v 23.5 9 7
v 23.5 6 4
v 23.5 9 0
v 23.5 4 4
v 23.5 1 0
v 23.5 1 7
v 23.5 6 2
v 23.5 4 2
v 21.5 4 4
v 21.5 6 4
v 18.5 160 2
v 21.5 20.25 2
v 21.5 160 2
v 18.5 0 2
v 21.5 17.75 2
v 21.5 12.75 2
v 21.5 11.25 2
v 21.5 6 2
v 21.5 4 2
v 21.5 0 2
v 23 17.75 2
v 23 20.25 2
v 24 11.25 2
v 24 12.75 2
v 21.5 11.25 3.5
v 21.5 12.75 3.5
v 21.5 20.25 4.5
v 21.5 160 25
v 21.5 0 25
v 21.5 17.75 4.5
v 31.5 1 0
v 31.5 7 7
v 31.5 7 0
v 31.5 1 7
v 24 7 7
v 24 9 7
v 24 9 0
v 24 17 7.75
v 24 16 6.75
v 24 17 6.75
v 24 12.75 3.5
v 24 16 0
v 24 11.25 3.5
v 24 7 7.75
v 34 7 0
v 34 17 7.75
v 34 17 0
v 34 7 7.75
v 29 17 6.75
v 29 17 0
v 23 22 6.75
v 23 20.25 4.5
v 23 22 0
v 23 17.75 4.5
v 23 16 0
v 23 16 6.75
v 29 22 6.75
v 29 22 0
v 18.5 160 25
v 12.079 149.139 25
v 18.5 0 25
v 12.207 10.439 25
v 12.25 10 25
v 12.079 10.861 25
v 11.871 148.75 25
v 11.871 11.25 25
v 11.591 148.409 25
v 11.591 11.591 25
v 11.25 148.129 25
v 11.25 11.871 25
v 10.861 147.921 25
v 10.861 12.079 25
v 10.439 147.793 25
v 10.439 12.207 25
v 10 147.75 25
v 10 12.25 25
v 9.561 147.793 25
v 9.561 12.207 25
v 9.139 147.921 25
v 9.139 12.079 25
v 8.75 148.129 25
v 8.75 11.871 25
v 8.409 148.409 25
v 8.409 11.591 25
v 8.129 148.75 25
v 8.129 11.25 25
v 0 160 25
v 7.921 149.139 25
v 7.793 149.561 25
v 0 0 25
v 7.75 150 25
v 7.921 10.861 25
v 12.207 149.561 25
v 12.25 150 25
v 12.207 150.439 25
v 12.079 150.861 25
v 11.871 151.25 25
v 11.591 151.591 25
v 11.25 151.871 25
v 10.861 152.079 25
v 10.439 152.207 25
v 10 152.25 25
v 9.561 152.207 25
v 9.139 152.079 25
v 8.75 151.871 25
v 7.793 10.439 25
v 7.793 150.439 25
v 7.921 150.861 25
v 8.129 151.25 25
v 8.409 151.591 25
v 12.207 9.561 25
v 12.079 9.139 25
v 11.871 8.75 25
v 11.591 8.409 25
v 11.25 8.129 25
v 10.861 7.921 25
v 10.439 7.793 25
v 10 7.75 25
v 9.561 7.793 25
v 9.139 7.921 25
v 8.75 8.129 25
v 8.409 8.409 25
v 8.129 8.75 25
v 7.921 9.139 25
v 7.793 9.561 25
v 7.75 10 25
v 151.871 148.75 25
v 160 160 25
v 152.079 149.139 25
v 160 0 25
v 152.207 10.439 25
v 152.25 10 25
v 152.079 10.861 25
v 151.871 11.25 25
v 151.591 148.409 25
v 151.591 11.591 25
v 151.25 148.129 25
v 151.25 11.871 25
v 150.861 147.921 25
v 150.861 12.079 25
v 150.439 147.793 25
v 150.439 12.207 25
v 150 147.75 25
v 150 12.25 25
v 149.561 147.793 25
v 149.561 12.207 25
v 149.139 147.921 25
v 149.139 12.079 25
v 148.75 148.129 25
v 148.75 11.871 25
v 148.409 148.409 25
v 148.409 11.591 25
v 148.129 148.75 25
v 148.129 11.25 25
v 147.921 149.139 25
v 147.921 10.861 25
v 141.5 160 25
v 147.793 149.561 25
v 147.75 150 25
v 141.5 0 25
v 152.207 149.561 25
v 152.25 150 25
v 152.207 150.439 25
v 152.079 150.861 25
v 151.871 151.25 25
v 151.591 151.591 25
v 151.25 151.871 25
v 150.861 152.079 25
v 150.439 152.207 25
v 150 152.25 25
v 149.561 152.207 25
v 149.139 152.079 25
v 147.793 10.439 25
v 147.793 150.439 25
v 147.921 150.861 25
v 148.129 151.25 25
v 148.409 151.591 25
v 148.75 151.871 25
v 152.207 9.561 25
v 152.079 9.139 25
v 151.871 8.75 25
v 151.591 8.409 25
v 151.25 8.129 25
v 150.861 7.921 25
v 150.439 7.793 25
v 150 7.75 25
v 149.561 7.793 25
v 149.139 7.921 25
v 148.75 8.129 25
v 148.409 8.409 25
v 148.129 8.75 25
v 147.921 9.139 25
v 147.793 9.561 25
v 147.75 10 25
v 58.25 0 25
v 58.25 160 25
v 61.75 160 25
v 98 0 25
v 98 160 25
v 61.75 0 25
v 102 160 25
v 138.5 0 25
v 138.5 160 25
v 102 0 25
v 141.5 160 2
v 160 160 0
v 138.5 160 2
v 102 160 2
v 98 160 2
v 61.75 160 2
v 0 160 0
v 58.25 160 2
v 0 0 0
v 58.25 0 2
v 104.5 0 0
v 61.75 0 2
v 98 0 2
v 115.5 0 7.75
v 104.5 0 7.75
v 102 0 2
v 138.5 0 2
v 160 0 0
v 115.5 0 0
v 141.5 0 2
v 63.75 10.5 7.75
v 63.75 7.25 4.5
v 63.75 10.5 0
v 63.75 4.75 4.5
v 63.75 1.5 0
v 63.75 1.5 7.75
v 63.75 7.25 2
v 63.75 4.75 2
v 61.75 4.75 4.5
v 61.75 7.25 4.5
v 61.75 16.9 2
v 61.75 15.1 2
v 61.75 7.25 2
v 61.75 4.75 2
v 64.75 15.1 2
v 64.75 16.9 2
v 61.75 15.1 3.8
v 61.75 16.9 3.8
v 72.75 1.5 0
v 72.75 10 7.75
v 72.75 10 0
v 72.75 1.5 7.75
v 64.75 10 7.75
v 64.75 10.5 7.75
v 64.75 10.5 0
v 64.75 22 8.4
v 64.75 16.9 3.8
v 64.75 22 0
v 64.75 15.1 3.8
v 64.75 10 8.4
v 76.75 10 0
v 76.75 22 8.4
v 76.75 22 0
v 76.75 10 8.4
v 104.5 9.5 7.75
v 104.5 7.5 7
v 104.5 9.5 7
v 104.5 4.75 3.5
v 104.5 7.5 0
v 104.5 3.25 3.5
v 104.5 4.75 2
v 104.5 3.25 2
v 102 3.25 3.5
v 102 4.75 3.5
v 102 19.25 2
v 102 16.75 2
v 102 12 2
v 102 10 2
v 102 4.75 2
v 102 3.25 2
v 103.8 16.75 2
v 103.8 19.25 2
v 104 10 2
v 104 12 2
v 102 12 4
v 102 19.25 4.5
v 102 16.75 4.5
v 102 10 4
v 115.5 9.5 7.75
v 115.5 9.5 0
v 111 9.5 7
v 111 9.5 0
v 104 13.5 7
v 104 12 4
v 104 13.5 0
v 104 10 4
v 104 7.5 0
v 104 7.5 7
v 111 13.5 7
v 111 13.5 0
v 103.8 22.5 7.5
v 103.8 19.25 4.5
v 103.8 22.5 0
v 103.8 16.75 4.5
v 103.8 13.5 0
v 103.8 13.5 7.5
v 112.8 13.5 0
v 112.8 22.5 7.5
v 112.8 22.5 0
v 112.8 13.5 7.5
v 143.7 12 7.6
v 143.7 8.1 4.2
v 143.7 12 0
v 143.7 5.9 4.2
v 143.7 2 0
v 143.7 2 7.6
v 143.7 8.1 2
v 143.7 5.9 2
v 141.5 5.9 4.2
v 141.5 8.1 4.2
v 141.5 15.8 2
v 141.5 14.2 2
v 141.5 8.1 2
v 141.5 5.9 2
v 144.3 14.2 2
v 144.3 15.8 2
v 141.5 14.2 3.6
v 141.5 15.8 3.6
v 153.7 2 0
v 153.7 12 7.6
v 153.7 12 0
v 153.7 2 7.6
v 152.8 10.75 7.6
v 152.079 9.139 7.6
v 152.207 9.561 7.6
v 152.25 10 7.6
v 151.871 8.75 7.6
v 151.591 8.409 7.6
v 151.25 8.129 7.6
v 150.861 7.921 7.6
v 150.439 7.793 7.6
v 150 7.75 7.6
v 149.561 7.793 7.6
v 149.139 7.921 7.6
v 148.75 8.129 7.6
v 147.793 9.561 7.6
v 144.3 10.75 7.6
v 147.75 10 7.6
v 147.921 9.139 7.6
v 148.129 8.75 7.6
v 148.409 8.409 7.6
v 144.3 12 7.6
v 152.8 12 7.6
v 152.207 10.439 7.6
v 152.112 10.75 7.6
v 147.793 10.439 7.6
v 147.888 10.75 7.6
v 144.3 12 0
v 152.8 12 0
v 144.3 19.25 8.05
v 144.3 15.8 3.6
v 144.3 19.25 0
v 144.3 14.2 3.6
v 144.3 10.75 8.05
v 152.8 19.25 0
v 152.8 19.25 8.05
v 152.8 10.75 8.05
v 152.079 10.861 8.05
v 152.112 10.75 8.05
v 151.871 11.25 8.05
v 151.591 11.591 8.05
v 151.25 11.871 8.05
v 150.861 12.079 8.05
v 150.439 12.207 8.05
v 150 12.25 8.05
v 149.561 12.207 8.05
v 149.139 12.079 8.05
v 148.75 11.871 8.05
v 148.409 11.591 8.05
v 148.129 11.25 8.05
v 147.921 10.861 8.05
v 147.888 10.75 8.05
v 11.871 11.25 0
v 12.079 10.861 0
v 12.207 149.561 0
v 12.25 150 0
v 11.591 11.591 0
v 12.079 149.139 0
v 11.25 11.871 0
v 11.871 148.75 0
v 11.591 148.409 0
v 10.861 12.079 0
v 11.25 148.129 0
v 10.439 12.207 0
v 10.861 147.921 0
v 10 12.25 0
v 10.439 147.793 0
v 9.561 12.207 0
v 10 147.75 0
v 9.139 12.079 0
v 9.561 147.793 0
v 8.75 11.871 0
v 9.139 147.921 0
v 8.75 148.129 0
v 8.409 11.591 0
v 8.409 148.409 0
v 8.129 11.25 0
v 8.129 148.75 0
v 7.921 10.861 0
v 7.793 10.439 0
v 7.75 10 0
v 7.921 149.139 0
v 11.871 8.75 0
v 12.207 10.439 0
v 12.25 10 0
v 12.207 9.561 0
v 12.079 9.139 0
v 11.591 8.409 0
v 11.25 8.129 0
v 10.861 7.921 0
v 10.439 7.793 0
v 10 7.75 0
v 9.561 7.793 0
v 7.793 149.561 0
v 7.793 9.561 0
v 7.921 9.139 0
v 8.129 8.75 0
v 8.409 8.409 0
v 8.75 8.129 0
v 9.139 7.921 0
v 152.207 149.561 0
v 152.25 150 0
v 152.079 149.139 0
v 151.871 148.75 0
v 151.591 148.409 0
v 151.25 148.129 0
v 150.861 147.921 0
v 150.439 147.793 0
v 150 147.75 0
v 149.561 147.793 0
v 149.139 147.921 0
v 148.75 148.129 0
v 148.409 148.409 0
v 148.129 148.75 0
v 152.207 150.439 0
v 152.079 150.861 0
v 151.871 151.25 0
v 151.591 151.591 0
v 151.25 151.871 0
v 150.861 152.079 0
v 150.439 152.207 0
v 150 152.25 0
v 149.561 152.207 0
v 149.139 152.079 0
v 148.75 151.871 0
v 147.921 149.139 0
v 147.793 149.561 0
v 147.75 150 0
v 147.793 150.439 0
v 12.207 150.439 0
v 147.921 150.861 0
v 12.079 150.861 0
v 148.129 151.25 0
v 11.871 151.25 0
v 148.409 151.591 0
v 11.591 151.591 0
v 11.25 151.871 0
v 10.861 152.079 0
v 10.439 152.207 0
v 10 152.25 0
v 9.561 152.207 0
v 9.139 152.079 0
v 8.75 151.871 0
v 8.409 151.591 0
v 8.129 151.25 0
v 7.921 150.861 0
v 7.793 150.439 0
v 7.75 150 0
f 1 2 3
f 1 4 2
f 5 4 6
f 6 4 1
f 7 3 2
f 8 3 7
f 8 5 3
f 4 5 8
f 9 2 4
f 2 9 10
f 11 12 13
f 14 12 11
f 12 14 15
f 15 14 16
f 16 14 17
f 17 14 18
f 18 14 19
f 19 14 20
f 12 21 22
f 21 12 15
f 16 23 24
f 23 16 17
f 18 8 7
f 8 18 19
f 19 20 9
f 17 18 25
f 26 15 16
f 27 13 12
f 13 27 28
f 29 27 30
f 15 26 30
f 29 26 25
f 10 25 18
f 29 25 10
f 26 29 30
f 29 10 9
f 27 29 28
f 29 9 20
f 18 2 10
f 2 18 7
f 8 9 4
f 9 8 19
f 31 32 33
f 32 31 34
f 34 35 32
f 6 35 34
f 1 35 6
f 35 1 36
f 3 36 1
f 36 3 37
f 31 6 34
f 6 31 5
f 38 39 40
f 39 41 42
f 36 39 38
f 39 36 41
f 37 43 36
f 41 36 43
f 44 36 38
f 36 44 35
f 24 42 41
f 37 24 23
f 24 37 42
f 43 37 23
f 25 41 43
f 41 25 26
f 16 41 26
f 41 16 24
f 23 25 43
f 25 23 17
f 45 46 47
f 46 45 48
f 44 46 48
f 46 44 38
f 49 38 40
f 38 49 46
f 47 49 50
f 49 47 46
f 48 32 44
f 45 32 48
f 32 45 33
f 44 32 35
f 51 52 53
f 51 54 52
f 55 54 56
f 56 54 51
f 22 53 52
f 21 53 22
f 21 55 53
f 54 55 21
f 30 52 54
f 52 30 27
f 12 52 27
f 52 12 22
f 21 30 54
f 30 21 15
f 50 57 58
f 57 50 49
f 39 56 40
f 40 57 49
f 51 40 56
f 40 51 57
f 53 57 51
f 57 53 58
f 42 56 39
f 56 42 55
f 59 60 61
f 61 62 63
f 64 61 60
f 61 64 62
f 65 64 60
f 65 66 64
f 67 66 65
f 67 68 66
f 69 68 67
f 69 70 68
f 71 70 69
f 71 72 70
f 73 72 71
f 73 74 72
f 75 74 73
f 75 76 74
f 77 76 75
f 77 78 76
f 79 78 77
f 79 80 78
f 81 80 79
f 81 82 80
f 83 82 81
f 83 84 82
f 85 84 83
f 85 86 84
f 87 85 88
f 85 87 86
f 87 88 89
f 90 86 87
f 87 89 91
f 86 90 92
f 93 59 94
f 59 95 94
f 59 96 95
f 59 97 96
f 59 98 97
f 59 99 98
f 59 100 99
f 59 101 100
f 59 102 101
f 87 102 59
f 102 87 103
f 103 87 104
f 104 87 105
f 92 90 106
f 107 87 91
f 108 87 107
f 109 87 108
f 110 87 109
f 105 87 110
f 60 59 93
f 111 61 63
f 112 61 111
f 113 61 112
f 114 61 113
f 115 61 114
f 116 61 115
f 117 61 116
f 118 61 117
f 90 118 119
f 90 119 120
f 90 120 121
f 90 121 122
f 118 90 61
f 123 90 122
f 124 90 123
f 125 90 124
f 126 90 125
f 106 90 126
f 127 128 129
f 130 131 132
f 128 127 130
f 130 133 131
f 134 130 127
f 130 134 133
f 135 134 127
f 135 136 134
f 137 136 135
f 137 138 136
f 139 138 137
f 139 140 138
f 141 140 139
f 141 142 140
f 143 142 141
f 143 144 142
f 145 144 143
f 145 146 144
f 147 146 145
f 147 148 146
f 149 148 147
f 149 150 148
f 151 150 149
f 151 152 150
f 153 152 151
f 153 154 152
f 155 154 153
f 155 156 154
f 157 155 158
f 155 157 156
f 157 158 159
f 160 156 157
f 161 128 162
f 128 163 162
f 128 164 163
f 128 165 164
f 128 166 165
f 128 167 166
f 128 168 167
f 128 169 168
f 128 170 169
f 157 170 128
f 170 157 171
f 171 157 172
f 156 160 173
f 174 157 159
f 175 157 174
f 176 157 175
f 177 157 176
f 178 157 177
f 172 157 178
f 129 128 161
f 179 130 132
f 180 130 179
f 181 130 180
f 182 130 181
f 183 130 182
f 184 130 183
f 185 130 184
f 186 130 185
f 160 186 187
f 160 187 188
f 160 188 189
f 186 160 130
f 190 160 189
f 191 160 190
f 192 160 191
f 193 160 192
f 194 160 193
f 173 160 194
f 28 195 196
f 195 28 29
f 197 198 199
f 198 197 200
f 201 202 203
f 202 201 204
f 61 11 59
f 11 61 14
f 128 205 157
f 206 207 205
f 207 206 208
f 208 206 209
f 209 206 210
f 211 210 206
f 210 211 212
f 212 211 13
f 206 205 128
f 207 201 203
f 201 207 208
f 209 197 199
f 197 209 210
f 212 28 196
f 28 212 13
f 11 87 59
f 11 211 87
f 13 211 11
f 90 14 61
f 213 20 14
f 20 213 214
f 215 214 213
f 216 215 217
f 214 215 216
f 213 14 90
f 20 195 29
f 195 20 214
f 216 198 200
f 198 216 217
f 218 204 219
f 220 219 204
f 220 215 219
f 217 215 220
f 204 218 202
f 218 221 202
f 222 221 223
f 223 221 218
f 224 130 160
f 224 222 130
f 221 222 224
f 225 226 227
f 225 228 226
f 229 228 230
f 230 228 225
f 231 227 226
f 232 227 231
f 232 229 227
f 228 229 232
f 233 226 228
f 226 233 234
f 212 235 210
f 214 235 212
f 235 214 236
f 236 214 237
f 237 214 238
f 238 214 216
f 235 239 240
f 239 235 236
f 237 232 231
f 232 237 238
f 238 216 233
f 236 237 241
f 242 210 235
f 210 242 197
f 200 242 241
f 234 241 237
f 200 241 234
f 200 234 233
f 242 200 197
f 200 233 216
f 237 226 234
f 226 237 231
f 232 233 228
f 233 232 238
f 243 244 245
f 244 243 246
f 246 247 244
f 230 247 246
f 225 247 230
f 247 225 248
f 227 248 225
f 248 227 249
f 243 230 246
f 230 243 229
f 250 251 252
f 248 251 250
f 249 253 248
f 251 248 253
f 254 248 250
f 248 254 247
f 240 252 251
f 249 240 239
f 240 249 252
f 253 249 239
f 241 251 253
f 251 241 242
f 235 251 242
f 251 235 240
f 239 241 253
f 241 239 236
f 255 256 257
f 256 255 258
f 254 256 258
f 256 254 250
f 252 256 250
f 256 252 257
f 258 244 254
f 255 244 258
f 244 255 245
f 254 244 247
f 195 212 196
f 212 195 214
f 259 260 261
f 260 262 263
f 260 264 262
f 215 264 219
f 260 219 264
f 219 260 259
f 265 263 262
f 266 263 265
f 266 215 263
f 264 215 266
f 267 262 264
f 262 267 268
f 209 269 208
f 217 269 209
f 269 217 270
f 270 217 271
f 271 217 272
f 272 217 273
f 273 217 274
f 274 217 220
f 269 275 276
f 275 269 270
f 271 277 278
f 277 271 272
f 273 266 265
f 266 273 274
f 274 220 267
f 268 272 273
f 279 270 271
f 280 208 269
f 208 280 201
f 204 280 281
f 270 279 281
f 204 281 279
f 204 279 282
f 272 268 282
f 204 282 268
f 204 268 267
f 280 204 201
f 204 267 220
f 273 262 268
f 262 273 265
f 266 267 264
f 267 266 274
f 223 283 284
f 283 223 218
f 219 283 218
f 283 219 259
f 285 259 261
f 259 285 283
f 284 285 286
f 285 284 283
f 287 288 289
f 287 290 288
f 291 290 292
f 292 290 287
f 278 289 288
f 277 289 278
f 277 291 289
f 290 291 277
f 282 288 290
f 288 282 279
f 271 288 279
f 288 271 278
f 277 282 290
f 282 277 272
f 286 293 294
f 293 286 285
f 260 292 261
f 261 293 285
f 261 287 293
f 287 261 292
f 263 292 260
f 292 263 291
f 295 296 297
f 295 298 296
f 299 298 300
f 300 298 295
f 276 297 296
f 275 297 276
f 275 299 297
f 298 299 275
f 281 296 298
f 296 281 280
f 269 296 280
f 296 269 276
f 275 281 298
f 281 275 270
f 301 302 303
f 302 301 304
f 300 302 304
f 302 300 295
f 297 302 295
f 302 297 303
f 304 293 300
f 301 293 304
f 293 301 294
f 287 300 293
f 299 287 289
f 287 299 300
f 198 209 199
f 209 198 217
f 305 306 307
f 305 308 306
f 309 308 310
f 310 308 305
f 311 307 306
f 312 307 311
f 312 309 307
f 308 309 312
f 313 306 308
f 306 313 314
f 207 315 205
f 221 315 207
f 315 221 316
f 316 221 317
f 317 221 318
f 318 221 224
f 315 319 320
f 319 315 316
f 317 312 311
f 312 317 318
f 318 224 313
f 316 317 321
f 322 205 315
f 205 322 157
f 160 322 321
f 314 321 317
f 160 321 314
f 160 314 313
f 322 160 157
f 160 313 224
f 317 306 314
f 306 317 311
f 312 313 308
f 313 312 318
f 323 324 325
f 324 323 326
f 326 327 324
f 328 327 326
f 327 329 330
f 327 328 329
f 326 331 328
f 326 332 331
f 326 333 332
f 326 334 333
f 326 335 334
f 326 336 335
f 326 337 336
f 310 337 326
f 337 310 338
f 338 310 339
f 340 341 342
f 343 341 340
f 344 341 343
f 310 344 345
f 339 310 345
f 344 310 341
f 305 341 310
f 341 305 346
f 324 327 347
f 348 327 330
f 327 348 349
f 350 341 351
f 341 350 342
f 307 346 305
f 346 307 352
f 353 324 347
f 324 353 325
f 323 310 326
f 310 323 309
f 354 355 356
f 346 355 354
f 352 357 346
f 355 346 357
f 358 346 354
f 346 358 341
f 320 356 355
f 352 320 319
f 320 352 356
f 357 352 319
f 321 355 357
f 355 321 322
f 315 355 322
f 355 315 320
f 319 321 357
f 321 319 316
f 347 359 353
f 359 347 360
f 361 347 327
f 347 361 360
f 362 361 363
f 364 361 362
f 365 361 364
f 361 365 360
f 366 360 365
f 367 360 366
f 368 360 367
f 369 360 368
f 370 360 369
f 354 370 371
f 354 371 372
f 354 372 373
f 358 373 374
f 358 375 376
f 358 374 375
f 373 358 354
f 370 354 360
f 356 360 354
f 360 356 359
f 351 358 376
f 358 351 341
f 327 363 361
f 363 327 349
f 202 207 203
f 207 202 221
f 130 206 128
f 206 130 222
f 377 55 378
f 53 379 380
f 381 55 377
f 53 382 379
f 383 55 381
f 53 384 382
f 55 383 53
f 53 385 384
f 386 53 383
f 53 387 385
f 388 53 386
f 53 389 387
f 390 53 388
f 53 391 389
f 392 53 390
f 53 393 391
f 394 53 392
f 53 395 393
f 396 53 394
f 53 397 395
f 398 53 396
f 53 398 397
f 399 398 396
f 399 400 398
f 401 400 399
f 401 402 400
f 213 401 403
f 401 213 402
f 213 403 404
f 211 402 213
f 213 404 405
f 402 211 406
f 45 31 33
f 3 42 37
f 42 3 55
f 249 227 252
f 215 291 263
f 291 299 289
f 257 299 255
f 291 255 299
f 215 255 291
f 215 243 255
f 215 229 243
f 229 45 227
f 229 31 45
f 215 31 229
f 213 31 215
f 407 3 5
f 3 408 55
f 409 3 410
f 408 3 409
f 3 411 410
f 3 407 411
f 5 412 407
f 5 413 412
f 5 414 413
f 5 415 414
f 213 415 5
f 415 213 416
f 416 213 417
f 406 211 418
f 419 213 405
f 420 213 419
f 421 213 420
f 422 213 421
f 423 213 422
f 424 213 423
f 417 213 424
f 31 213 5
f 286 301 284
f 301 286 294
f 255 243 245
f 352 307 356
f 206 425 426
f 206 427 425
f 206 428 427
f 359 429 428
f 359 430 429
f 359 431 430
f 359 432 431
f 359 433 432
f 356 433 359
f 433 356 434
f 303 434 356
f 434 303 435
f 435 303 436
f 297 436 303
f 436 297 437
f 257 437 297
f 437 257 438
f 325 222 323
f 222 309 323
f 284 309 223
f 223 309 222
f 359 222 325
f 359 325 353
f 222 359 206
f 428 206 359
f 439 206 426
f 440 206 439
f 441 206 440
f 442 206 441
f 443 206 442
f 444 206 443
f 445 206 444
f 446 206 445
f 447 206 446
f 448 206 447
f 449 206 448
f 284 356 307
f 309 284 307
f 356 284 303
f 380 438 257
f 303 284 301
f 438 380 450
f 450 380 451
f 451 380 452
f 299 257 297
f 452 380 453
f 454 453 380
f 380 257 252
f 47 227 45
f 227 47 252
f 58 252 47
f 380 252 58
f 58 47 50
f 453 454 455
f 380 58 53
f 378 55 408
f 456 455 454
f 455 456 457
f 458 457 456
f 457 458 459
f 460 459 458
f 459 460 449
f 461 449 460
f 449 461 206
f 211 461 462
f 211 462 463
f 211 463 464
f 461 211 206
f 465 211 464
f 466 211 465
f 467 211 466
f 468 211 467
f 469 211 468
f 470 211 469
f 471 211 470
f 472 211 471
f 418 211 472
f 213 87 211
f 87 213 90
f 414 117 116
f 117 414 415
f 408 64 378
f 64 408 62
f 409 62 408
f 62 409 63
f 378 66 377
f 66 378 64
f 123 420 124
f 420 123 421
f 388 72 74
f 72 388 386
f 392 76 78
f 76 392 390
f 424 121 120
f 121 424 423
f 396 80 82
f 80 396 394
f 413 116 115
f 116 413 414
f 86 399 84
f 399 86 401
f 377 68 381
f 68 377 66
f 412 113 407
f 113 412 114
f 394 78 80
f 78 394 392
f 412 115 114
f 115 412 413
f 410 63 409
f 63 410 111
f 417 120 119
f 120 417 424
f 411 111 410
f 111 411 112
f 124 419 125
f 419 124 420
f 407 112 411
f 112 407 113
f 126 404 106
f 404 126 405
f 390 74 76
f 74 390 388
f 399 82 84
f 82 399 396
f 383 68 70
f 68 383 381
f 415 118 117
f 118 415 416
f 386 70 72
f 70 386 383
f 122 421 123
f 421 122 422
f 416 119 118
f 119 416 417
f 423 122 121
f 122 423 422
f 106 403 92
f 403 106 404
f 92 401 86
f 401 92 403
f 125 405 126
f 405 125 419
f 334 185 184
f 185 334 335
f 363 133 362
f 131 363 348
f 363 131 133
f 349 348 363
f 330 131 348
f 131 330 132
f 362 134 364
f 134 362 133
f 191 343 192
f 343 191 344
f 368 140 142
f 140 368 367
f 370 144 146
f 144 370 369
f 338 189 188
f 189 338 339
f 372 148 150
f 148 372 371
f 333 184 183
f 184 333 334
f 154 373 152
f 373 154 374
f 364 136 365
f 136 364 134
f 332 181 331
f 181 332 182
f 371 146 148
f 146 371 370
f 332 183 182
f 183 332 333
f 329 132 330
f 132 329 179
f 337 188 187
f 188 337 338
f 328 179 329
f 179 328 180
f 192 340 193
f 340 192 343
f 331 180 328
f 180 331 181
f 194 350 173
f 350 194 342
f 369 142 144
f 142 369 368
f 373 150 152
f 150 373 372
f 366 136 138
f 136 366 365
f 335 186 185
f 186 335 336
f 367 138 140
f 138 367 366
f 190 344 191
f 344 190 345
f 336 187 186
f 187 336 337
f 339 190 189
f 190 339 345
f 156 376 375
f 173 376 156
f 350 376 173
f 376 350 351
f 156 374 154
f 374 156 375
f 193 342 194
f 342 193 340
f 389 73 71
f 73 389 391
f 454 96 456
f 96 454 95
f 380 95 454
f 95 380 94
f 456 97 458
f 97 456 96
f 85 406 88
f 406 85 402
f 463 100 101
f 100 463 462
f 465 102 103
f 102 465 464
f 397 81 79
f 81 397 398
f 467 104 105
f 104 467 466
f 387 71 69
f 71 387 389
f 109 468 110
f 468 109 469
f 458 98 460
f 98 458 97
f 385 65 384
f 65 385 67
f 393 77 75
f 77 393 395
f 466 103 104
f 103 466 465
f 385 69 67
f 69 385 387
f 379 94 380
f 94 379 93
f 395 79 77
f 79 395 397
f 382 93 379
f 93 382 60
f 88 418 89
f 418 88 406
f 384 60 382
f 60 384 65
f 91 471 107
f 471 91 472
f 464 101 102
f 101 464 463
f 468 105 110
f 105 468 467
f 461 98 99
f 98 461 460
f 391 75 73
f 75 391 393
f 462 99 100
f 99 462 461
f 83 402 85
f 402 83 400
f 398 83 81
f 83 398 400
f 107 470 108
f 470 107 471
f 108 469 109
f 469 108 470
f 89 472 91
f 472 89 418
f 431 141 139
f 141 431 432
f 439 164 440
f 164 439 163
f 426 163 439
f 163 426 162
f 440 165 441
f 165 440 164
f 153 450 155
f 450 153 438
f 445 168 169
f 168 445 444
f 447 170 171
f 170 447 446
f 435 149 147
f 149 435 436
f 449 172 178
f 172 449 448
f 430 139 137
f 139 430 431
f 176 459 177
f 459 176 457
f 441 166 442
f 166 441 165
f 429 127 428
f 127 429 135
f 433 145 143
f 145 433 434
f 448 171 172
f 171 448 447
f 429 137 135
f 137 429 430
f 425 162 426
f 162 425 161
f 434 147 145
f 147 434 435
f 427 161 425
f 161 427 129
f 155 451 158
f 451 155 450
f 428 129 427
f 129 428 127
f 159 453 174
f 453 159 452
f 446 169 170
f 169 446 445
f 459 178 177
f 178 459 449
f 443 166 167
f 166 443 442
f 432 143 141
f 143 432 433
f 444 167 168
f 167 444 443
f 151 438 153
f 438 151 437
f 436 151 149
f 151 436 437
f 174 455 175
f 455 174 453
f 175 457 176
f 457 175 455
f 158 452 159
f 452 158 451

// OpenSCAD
// Metadiffuser Tile - Acoustic Panel
// Frequency range: 250-2000 Hz
// Based on: Jiménez et al. (2017) Nature Scientific Reports
// Tile size: 160×160×25mm

$fn = 32; // Resolution

module helmholtz_resonator(neck_w, neck_l, cavity_w, cavity_d, slit_w) {
    // Neck connecting slit to cavity
    translate([slit_w/2, -neck_w/2, 0])
        cube([neck_l, neck_w, neck_w]);
    
    // Resonant cavity
    translate([slit_w/2 + neck_l, -cavity_w/2, -cavity_d/2 + neck_w/2])
        cube([cavity_w, cavity_w, cavity_d]);
}

// Main model
difference() {
    // Base block (solid)
    cube([160, 160, 25]);
    
    // Slits and Helmholtz resonators
    // Slit 1 (width: 3.0mm)
    translate([20.0, 0, 2.0]) {
        // Main slit cavity
        translate([-1.5, 0, 0])
            cube([3.0, 160, 23.0]);
        
        // Helmholtz resonators
        // HR 1 at y=5mm
        translate([0, 5, 0])
            helmholtz_resonator(2.0, 2.0, 
                              8.0, 8.0, 3.0);
        // HR 2 at y=12mm
        translate([0, 12, 0])
            helmholtz_resonator(1.5, 2.5, 
                              10.0, 10.0, 3.0);
        // HR 3 at y=19mm
        translate([0, 19, 0])
            helmholtz_resonator(2.5, 1.5, 
                              6.0, 7.0, 3.0);
    }

    // Slit 2 (width: 3.5mm)
    translate([60.0, 0, 2.0]) {
        // Main slit cavity
        translate([-1.75, 0, 0])
            cube([3.5, 160, 23.0]);
        
        // Helmholtz resonators
        // HR 1 at y=6mm
        translate([0, 6, 0])
            helmholtz_resonator(2.5, 2.0, 
                              9.0, 9.0, 3.5);
        // HR 2 at y=16mm
        translate([0, 16, 0])
            helmholtz_resonator(1.8, 3.0, 
                              12.0, 11.0, 3.5);
    }

    // Slit 3 (width: 4.0mm)
    translate([100.0, 0, 2.0]) {
        // Main slit cavity
        translate([-2.0, 0, 0])
            cube([4.0, 160, 23.0]);
        
        // Helmholtz resonators
        // HR 1 at y=4mm
        translate([0, 4, 0])
            helmholtz_resonator(1.5, 2.5, 
                              11.0, 10.0, 4.0);
        // HR 2 at y=11mm
        translate([0, 11, 0])
            helmholtz_resonator(2.0, 2.0, 
                              7.0, 8.0, 4.0);
        // HR 3 at y=18mm
        translate([0, 18, 0])
            helmholtz_resonator(2.5, 1.8, 
                              9.0, 8.5, 4.0);
    }

    // Slit 4 (width: 3.0mm)
    translate([140.0, 0, 2.0]) {
        // Main slit cavity
        translate([-1.5, 0, 0])
            cube([3.0, 160, 23.0]);
        
        // Helmholtz resonators
        // HR 1 at y=7mm
        translate([0, 7, 0])
            helmholtz_resonator(2.2, 2.2, 
                              10.0, 9.0, 3.0);
        // HR 2 at y=15mm
        translate([0, 15, 0])
            helmholtz_resonator(1.6, 2.8, 
                              8.5, 10.5, 3.0);
    }

    // Mounting holes (M4)
    translate([10, 10, 12.5])
        cylinder(d=4.5, h=27, center=true);
    translate([150, 10, 12.5])
        cylinder(d=4.5, h=27, center=true);
    translate([10, 150, 12.5])
        cylinder(d=4.5, h=27, center=true);
    translate([150, 150, 12.5])
        cylinder(d=4.5, h=27, center=true);
}
